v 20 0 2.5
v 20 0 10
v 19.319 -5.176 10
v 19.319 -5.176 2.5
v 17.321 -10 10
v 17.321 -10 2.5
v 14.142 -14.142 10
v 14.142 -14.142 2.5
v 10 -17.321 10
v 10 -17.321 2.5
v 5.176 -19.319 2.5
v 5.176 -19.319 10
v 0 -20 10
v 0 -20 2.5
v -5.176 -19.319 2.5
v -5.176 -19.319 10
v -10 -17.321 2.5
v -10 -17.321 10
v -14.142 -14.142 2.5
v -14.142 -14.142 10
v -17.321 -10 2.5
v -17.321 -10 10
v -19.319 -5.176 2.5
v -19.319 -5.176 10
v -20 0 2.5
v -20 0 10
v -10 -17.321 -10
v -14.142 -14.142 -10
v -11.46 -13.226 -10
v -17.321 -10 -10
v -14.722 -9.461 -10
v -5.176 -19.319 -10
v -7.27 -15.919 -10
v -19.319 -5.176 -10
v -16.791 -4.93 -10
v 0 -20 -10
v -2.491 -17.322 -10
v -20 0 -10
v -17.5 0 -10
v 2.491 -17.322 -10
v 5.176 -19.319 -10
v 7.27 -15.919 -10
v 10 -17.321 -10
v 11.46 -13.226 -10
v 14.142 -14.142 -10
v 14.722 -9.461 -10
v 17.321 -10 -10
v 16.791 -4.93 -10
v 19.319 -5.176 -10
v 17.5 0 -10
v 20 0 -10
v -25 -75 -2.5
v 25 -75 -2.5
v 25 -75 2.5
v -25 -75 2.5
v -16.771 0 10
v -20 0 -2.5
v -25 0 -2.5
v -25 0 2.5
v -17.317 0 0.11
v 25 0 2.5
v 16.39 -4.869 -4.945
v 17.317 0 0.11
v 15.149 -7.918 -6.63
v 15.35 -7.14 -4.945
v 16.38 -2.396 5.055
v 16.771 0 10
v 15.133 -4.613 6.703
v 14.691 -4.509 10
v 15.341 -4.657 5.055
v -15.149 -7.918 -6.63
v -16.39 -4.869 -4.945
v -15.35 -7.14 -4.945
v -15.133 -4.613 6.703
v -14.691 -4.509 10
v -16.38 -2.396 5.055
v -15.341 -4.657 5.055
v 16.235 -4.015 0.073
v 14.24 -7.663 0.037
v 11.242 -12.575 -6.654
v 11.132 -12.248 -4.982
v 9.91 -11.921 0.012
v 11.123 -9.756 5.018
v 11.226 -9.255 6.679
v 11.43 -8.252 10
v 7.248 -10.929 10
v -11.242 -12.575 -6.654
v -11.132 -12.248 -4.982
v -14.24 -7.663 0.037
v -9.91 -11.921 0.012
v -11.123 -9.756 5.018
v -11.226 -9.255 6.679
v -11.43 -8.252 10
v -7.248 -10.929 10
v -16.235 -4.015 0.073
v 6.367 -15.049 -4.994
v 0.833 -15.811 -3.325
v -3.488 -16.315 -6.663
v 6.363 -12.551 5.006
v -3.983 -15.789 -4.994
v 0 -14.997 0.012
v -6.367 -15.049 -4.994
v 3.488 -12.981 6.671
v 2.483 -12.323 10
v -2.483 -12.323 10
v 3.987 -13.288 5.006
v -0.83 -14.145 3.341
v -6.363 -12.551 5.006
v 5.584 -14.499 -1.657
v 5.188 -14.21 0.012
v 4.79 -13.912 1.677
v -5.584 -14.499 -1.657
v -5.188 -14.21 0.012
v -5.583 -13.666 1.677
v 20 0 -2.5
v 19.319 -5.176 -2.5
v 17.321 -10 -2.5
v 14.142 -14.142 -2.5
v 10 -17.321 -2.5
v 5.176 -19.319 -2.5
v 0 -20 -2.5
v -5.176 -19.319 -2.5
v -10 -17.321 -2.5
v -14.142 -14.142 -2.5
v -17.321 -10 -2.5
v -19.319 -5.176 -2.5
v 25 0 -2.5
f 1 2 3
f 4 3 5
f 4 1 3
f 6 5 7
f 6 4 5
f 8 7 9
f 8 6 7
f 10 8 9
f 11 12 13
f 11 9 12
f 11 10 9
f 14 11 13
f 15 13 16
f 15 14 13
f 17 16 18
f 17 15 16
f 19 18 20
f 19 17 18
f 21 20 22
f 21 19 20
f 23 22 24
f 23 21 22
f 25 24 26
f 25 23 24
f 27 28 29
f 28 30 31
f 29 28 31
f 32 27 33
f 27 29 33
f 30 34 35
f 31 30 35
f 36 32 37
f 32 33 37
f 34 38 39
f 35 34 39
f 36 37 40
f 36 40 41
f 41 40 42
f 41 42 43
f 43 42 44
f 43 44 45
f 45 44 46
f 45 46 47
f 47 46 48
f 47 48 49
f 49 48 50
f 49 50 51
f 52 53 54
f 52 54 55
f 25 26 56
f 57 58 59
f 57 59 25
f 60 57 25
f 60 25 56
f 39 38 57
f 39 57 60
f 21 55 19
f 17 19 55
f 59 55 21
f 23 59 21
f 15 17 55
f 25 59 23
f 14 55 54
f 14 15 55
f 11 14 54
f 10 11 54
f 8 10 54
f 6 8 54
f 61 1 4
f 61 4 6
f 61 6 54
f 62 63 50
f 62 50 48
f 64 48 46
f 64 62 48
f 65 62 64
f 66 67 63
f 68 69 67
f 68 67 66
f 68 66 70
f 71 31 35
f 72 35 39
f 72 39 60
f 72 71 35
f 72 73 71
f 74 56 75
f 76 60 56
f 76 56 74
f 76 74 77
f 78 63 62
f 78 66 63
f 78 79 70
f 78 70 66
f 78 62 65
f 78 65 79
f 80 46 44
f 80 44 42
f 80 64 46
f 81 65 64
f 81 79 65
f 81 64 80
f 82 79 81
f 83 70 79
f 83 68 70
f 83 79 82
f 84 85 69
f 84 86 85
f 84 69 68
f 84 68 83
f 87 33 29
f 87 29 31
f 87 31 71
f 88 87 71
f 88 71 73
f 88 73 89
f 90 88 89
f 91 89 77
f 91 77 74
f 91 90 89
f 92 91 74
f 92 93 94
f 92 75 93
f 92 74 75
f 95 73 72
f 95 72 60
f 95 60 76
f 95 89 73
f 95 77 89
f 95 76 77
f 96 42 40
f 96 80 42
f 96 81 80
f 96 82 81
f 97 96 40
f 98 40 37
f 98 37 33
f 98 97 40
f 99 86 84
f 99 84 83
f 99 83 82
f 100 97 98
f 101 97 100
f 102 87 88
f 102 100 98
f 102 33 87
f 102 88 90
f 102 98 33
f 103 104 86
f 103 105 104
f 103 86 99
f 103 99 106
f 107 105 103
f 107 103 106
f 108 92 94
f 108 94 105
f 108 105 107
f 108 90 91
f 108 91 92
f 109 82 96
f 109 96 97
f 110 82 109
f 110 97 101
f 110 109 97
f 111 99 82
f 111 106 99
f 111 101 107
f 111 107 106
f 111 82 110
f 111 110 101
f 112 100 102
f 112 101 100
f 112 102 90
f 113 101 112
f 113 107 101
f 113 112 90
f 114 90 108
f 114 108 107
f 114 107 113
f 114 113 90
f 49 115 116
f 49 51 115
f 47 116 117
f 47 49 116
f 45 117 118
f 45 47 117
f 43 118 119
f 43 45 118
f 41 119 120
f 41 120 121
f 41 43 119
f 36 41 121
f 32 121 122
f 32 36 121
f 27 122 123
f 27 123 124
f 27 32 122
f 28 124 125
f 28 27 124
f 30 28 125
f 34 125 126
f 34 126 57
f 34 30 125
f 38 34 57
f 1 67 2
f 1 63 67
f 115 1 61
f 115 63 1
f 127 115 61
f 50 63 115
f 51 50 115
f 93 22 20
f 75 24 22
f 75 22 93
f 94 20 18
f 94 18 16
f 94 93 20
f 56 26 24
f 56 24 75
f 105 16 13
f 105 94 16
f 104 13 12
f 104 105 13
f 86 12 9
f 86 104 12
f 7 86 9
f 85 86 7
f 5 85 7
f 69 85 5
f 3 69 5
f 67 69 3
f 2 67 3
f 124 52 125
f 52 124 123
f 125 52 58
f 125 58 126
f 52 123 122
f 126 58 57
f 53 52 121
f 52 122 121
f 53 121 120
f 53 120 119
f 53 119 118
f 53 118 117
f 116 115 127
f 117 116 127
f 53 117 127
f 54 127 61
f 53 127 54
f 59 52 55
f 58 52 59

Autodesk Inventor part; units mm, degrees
ref_plane "YZ Plane" through (0, 0, 0) normal (1, 0, 0) x (0, 1, 0)
ref_plane "XZ Plane" through (0, 0, 0) normal (0, 1, 0) x (-1, 0, 0)
ref_plane "XY Plane" through (0, 0, 0) normal (0, 0, 1) x (1, 0, 0)
sketch "草圖1" plane through (0, 0, 0) normal (0, 0, 1) x (1, 0, 0)
  arc A0 (-17.5, 0) -> (17.5, 0) centre (0, 0) ccw
  arc A1 (-20, 0) -> (20, 0) centre (0, 0) ccw
  line L0 (-20, 0) -> (-17.5, 0)
  line L1 (20, 0) -> (17.5, 0)
  line L2 (-35, 0) -> (35, 0) projected
  line L3 (-25, 0) -> (25, 0)
  line L4 (25, -75) -> (-25, -75)
  line L5 (-25, -75) -> (-25, 0)
  line L6 (-25, 0) -> (25, 0)
  line L7 (25, 0) -> (25, -75)
  line L8 (25, -75) -> (-25, 0) construction
  line L9 (-25, -75) -> (25, 0) construction
  line L10 (0, -90) -> (0, 15) projected
  point P0 (17.5, 0)
  point P1 (20, 0)
  point P2 (20, 0)
  point P3 (0, -37.5)
  dimension "d0" = 17.5
  dimension "d16" = 50
  dimension "d17" = 75
  dimension "d22" = 20
extrude "擠出1" add sketch "草圖1" along normal mid plane 20 contours L2 L10 A0 | A0 L10 A1 L0 | L10 L2 A0 | A0 L1 A1 L10
extrude "擠出2" add sketch "草圖1" along normal mid plane 5
sketch "草圖2" plane through (0, 0, 0) normal (1, 0, 0) x (0, 1, 0)
  line L0 (-10, -10) -> (-5, 10)
  line L1 (0, -2.5) -> (0, -10) projected
  line L2 (0, 10) -> (0, 2.5) projected
  line L3 (-20, -10) -> (0, -10) projected
  line L4 (0, 10) -> (-20, 10) projected
  point P0 (0, 0)
  dimension "d18" = 10
  dimension "d19" = 5
sketch "草圖3" plane through (0, 0, -10) normal (0, 0, -1) x (-1, 0, 0)
  arc A0 (-17.5, 0) -> (17.5, 0) centre (0, 0) ccw projected
  line L0 (25, 0) -> (-25, 0) projected
sweep "掃掠1" cut profiles "草圖3" path "草圖2" path curves L0
